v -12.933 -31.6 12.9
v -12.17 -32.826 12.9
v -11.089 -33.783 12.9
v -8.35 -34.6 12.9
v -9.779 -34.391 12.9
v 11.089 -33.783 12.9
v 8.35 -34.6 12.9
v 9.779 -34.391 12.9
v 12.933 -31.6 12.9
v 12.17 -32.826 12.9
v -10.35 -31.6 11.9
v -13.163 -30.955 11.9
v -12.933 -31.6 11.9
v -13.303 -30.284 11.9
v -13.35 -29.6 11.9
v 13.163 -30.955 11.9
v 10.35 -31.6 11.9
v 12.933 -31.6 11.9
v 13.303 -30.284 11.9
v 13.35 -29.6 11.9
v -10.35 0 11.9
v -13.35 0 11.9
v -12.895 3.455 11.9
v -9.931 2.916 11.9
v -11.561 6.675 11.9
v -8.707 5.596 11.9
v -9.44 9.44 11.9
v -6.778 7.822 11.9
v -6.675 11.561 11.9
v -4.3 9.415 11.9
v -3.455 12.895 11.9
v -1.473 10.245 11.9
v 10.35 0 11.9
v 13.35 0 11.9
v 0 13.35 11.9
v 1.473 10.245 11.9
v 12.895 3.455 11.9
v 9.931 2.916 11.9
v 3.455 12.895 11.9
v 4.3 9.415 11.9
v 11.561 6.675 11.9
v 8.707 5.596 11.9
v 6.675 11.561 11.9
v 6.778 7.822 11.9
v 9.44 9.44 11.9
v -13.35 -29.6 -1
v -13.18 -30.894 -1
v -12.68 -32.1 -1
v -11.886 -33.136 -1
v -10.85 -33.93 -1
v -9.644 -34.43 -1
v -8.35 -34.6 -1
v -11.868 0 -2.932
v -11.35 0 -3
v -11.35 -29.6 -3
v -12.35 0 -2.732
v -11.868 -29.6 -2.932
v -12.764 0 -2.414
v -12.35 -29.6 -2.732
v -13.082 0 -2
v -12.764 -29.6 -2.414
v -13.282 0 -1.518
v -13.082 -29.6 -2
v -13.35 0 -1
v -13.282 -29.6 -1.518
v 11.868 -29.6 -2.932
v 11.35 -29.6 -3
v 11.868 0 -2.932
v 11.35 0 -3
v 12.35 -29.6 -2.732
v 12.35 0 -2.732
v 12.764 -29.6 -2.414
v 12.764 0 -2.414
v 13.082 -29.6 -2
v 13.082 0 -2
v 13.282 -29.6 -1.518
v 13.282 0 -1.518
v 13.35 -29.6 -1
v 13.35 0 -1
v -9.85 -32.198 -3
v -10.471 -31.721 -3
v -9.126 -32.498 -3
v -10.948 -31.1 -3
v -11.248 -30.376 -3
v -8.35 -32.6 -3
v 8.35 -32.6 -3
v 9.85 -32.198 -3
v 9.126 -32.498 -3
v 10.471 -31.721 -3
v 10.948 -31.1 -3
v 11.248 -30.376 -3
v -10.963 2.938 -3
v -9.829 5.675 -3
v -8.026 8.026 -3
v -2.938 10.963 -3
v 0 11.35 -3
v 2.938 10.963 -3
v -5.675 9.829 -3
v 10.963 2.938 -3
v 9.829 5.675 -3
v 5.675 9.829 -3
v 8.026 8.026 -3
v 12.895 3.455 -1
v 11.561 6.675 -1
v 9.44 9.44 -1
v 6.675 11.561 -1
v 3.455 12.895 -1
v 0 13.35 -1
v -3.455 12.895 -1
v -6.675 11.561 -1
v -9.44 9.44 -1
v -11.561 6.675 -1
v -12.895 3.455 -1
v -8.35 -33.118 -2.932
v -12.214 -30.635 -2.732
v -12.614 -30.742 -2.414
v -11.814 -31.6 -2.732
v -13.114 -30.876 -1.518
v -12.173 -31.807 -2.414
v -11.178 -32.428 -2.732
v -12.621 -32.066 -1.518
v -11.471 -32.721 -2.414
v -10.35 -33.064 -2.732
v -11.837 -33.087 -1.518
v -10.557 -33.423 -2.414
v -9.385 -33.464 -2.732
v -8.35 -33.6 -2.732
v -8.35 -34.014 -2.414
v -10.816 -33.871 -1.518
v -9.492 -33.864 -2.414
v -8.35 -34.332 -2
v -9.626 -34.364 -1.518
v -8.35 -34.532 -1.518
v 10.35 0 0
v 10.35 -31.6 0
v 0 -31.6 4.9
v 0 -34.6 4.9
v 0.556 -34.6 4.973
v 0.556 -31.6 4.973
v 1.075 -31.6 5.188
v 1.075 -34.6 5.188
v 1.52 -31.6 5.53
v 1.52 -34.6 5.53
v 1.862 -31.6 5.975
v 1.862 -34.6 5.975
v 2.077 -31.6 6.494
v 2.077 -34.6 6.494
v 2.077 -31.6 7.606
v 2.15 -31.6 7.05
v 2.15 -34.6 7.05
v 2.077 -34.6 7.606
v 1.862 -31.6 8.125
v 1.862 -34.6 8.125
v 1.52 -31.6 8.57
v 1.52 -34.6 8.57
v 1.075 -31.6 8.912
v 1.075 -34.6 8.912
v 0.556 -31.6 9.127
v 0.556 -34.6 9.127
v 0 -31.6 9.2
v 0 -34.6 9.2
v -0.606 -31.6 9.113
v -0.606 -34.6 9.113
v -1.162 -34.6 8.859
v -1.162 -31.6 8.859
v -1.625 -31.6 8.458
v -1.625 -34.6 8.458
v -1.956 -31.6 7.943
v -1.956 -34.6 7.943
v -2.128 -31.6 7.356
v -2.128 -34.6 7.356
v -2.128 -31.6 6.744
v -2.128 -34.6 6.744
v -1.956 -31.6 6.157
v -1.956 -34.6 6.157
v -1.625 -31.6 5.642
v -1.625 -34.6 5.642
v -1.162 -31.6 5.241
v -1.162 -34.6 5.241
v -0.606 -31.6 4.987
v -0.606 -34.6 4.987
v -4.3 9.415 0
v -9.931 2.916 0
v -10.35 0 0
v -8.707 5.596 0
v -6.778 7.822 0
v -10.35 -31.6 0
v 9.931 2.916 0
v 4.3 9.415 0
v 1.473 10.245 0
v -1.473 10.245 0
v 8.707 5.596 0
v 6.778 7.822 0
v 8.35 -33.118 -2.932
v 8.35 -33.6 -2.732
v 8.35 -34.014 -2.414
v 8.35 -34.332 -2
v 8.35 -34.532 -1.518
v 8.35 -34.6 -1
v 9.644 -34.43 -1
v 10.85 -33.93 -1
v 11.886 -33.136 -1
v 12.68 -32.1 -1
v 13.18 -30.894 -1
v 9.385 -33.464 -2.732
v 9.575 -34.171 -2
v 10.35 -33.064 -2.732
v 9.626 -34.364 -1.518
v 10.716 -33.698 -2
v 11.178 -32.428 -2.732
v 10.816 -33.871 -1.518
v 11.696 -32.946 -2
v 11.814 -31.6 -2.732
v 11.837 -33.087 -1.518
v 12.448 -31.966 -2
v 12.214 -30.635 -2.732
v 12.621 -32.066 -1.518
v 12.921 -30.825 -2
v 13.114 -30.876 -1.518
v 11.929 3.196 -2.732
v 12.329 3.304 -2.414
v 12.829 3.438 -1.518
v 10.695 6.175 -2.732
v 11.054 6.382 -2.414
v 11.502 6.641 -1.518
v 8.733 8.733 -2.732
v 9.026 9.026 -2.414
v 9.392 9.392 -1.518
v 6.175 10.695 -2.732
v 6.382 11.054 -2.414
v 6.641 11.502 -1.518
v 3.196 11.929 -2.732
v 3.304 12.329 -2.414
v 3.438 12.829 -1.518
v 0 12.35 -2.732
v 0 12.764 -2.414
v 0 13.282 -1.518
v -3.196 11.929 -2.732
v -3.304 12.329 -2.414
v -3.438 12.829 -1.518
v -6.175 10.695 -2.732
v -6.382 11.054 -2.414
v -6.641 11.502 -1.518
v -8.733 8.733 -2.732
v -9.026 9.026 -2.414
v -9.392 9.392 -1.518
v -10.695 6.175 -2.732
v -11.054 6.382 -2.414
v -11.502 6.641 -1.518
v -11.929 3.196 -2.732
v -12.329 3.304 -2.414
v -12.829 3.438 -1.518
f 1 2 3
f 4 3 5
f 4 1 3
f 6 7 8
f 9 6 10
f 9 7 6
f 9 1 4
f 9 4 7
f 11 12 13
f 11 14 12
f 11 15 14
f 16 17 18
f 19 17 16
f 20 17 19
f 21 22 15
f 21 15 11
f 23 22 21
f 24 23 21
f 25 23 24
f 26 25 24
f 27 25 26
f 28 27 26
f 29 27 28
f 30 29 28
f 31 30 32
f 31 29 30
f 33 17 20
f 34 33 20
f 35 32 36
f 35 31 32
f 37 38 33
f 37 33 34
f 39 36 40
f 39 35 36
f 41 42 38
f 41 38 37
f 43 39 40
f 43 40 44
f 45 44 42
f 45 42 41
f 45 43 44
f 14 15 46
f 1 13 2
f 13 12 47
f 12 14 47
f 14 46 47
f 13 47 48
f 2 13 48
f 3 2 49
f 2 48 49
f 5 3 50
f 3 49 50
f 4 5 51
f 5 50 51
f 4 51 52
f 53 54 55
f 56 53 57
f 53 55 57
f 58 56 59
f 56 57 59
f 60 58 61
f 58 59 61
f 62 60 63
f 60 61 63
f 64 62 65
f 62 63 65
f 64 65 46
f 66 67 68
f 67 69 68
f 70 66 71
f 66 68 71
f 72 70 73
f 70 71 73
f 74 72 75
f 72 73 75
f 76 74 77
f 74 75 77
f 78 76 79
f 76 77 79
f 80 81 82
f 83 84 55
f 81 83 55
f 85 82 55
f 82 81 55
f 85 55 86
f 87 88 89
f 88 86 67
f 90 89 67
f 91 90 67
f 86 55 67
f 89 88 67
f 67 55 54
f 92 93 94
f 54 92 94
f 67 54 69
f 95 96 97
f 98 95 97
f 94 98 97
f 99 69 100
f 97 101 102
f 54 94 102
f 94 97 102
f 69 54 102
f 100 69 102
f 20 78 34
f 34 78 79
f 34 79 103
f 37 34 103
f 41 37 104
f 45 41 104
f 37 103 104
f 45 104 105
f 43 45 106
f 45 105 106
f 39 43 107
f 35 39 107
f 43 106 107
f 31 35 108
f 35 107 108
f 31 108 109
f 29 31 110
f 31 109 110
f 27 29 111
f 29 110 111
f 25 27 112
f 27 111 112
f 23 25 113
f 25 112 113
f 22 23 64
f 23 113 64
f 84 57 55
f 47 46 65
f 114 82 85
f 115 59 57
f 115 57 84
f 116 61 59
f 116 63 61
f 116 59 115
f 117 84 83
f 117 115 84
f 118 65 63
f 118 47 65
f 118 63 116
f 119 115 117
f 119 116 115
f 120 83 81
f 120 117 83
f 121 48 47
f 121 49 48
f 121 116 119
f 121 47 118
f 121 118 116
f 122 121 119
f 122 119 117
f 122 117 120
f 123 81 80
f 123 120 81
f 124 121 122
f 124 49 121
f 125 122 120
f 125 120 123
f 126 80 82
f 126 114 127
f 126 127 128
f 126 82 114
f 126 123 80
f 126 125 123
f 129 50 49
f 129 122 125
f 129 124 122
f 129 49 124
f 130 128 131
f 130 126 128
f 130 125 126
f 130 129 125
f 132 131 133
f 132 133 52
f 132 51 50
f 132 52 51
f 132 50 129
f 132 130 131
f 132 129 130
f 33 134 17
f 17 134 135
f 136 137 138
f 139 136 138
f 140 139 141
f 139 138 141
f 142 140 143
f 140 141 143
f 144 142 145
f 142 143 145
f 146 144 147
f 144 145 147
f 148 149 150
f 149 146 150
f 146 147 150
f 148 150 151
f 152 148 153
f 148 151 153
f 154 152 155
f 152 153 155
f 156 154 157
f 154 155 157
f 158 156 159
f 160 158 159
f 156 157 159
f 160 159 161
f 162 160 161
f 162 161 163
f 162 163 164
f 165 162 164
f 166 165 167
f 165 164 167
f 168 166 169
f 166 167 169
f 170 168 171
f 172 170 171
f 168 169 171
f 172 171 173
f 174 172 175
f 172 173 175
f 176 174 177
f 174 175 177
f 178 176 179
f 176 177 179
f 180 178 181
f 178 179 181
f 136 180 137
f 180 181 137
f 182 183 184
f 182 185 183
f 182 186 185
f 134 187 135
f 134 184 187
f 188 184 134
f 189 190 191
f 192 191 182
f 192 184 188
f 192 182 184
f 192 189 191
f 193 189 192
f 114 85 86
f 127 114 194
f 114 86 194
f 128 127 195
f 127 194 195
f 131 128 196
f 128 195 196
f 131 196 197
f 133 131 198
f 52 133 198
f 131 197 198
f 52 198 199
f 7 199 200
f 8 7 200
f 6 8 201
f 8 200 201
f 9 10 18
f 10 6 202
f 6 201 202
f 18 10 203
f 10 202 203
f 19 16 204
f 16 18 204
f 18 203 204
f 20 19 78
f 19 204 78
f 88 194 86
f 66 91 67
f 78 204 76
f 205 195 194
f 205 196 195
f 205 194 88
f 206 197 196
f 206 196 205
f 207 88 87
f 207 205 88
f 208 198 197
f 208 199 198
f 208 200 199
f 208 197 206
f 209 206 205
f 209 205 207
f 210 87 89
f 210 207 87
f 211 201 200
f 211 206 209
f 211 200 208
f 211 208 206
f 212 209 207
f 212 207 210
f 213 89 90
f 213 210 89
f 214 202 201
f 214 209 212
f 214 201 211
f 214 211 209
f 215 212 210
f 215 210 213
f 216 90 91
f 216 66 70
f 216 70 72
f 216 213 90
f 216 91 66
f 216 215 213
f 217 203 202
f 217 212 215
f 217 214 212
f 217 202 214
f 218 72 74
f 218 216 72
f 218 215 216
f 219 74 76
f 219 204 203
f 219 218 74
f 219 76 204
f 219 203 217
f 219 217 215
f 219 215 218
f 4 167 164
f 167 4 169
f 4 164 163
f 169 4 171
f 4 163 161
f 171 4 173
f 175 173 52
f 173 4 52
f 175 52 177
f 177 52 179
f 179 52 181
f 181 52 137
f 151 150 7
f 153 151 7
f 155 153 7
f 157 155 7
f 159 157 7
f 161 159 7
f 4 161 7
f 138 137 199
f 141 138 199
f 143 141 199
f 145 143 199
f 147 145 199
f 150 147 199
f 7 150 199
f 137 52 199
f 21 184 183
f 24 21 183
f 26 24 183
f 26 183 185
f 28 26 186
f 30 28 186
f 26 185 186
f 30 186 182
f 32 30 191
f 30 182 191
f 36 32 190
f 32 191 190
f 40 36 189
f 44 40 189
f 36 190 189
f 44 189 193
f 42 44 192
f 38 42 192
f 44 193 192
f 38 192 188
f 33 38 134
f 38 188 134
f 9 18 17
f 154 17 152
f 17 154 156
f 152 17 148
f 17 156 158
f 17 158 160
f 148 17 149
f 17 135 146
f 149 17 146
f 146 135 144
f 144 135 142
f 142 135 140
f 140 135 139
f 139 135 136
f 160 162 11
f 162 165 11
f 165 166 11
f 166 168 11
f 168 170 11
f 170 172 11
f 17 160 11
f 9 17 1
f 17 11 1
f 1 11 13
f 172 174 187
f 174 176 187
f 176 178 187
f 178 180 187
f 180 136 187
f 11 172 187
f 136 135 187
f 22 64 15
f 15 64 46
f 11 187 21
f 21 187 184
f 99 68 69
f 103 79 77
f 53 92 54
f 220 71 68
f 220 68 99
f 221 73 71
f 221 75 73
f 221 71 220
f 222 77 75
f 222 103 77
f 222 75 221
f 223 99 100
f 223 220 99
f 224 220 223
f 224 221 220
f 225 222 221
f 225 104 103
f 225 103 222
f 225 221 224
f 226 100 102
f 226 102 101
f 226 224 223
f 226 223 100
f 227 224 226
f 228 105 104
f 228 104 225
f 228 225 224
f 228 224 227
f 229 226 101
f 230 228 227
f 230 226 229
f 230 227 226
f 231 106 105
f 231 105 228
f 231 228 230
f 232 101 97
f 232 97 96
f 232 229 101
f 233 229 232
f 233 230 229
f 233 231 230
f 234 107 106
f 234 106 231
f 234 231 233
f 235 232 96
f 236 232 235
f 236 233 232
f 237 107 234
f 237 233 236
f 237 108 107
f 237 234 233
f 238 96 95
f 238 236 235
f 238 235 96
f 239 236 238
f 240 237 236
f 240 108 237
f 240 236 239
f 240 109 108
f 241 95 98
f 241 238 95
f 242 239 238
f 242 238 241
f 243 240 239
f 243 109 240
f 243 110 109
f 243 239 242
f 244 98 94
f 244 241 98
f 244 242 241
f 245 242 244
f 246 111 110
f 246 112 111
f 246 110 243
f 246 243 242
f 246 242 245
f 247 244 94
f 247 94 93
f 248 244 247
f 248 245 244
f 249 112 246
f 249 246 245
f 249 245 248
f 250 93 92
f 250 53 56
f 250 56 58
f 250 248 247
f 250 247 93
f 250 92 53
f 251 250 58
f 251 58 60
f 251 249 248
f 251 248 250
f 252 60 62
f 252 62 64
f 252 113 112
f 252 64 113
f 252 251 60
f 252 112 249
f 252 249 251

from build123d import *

# Parameters (mm, degrees)
F1_DEPTH    = 3
F2_DEPTH    = 11.9
F4_DEPTH    = 1
F6_DEPTH    = 6
F7_T1_DEPTH = 40.9
F8_R        = 2
F9_R        = 3.5272638361
F10_DEPTH   = 1
F11_DEPTH   = 25


# Not quite as in the source:
# - a fillet or chamfer that OpenCascade refuses, or shapes differently, is made with other operations: its cross-section is extruded or revolved along the edge and cut away or added


with BuildPart() as f1:
    # F0 (on Top) → F1 (new body)
    with BuildSketch(Plane.XY):
        with BuildLine():
            Line((13.35, -34.6), (13.35, 0))
            ThreePointArc((13.35, 0), (0, 13.35), (-13.35, 0))
            Line((-13.35, 0), (-13.35, -34.6))
            Line((-13.35, -34.6), (13.35, -34.6))
        make_face()
        with BuildLine():
            Line((-10.35, -31.6), (-10.35, 0))
            ThreePointArc((-10.35, 0), (0, 10.35), (10.35, 0))
            Line((10.35, 0), (10.35, -31.6))
            Line((10.35, -31.6), (-10.35, -31.6))
        make_face(mode=Mode.SUBTRACT)
        with BuildLine():
            ThreePointArc((10.35, 0), (0, 10.35), (-10.35, 0))
            Line((-10.35, 0), (-10.35, -31.6))
            Line((-10.35, -31.6), (10.35, -31.6))
            Line((10.35, -31.6), (10.35, 0))
        make_face()
    extrude(amount=-F1_DEPTH)

    # F0 (on Top) → F2 (join)
    with BuildSketch(Plane.XY):
        with BuildLine():
            Line((13.35, -34.6), (13.35, 0))
            ThreePointArc((13.35, 0), (0, 13.35), (-13.35, 0))
            Line((-13.35, 0), (-13.35, -34.6))
            Line((-13.35, -34.6), (13.35, -34.6))
        make_face()
        with BuildLine():
            Line((-10.35, -31.6), (-10.35, 0))
            ThreePointArc((-10.35, 0), (0, 10.35), (10.35, 0))
            Line((10.35, 0), (10.35, -31.6))
            Line((10.35, -31.6), (-10.35, -31.6))
        make_face(mode=Mode.SUBTRACT)
    extrude(amount=F2_DEPTH)

    # F3 (on face) → F4 (join)
    with BuildSketch(Plane.XY.offset(11.9)):
        Polygon((-13.35, -34.6), (13.35, -34.6), (13.35, -31.6), (10.35, -31.6), (-10.35, -31.6), (-13.35, -31.6), align=None)
    extrude(amount=F4_DEPTH)

    # F5 (on face) → F6 (cut)
    with BuildSketch(Plane.XZ.offset(34.6)):
        with BuildLine():
            ThreePointArc((0, 9.2), (-2.15, 7.05), (0, 4.9))
            Line((0, 4.9), (0, 9.2))
        make_face()
        with BuildLine():
            Line((0, 9.2), (0, 4.9))
            ThreePointArc((0, 4.9), (1.5202795796, 5.5297204204), (2.15, 7.05))
            ThreePointArc((2.15, 7.05), (1.5202795796, 8.5702795796), (0, 9.2))
        make_face()
    extrude(amount=-F6_DEPTH, mode=Mode.SUBTRACT)

    # F7: fillet of radius 5 on 2 edges, made by hand

    # F7_s2 → F7_t1 (cut)
    with BuildSketch(Plane.XY.offset(-15.5)):
        with BuildLine():
            ThreePointArc((-13.35, -29.6), (-11.8855339059, -33.1355339059), (-8.35, -34.6))
            Line((-8.35, -34.6), (-13.35, -34.6))
            Line((-13.35, -34.6), (-13.35, -29.6))
        make_face()
        with BuildLine():
            ThreePointArc((8.35, -34.6), (11.8855339059, -33.1355339059), (13.35, -29.6))
            Line((13.35, -29.6), (13.35, -34.6))
            Line((13.35, -34.6), (8.35, -34.6))
        make_face()
    extrude(amount=F7_T1_DEPTH, mode=Mode.SUBTRACT)

    # F8
    f8_edges = [f1.edges().sort_by_distance(p)[0] for p in [
        (13.35, -14.8, -3),
    ]]
    fillet(f8_edges, radius=F8_R)

    # F9 (on face) → F10 (join)
    with BuildSketch(Plane(origin=(0, -31.6, 0), x_dir=(-1, 0, 0), z_dir=(0, 1, 0))):
        with Locations((0, 7.05)):
            Circle(F9_R)
    extrude(amount=-F10_DEPTH)

    # F11 (cut): a face of the model
    f11_faces = [f1.faces().sort_by_distance(p)[0] for p in [
        (0, -32.6, 7.05),
    ]]
    extrude(f11_faces, amount=-F11_DEPTH, mode=Mode.SUBTRACT)


solid = f1.part
